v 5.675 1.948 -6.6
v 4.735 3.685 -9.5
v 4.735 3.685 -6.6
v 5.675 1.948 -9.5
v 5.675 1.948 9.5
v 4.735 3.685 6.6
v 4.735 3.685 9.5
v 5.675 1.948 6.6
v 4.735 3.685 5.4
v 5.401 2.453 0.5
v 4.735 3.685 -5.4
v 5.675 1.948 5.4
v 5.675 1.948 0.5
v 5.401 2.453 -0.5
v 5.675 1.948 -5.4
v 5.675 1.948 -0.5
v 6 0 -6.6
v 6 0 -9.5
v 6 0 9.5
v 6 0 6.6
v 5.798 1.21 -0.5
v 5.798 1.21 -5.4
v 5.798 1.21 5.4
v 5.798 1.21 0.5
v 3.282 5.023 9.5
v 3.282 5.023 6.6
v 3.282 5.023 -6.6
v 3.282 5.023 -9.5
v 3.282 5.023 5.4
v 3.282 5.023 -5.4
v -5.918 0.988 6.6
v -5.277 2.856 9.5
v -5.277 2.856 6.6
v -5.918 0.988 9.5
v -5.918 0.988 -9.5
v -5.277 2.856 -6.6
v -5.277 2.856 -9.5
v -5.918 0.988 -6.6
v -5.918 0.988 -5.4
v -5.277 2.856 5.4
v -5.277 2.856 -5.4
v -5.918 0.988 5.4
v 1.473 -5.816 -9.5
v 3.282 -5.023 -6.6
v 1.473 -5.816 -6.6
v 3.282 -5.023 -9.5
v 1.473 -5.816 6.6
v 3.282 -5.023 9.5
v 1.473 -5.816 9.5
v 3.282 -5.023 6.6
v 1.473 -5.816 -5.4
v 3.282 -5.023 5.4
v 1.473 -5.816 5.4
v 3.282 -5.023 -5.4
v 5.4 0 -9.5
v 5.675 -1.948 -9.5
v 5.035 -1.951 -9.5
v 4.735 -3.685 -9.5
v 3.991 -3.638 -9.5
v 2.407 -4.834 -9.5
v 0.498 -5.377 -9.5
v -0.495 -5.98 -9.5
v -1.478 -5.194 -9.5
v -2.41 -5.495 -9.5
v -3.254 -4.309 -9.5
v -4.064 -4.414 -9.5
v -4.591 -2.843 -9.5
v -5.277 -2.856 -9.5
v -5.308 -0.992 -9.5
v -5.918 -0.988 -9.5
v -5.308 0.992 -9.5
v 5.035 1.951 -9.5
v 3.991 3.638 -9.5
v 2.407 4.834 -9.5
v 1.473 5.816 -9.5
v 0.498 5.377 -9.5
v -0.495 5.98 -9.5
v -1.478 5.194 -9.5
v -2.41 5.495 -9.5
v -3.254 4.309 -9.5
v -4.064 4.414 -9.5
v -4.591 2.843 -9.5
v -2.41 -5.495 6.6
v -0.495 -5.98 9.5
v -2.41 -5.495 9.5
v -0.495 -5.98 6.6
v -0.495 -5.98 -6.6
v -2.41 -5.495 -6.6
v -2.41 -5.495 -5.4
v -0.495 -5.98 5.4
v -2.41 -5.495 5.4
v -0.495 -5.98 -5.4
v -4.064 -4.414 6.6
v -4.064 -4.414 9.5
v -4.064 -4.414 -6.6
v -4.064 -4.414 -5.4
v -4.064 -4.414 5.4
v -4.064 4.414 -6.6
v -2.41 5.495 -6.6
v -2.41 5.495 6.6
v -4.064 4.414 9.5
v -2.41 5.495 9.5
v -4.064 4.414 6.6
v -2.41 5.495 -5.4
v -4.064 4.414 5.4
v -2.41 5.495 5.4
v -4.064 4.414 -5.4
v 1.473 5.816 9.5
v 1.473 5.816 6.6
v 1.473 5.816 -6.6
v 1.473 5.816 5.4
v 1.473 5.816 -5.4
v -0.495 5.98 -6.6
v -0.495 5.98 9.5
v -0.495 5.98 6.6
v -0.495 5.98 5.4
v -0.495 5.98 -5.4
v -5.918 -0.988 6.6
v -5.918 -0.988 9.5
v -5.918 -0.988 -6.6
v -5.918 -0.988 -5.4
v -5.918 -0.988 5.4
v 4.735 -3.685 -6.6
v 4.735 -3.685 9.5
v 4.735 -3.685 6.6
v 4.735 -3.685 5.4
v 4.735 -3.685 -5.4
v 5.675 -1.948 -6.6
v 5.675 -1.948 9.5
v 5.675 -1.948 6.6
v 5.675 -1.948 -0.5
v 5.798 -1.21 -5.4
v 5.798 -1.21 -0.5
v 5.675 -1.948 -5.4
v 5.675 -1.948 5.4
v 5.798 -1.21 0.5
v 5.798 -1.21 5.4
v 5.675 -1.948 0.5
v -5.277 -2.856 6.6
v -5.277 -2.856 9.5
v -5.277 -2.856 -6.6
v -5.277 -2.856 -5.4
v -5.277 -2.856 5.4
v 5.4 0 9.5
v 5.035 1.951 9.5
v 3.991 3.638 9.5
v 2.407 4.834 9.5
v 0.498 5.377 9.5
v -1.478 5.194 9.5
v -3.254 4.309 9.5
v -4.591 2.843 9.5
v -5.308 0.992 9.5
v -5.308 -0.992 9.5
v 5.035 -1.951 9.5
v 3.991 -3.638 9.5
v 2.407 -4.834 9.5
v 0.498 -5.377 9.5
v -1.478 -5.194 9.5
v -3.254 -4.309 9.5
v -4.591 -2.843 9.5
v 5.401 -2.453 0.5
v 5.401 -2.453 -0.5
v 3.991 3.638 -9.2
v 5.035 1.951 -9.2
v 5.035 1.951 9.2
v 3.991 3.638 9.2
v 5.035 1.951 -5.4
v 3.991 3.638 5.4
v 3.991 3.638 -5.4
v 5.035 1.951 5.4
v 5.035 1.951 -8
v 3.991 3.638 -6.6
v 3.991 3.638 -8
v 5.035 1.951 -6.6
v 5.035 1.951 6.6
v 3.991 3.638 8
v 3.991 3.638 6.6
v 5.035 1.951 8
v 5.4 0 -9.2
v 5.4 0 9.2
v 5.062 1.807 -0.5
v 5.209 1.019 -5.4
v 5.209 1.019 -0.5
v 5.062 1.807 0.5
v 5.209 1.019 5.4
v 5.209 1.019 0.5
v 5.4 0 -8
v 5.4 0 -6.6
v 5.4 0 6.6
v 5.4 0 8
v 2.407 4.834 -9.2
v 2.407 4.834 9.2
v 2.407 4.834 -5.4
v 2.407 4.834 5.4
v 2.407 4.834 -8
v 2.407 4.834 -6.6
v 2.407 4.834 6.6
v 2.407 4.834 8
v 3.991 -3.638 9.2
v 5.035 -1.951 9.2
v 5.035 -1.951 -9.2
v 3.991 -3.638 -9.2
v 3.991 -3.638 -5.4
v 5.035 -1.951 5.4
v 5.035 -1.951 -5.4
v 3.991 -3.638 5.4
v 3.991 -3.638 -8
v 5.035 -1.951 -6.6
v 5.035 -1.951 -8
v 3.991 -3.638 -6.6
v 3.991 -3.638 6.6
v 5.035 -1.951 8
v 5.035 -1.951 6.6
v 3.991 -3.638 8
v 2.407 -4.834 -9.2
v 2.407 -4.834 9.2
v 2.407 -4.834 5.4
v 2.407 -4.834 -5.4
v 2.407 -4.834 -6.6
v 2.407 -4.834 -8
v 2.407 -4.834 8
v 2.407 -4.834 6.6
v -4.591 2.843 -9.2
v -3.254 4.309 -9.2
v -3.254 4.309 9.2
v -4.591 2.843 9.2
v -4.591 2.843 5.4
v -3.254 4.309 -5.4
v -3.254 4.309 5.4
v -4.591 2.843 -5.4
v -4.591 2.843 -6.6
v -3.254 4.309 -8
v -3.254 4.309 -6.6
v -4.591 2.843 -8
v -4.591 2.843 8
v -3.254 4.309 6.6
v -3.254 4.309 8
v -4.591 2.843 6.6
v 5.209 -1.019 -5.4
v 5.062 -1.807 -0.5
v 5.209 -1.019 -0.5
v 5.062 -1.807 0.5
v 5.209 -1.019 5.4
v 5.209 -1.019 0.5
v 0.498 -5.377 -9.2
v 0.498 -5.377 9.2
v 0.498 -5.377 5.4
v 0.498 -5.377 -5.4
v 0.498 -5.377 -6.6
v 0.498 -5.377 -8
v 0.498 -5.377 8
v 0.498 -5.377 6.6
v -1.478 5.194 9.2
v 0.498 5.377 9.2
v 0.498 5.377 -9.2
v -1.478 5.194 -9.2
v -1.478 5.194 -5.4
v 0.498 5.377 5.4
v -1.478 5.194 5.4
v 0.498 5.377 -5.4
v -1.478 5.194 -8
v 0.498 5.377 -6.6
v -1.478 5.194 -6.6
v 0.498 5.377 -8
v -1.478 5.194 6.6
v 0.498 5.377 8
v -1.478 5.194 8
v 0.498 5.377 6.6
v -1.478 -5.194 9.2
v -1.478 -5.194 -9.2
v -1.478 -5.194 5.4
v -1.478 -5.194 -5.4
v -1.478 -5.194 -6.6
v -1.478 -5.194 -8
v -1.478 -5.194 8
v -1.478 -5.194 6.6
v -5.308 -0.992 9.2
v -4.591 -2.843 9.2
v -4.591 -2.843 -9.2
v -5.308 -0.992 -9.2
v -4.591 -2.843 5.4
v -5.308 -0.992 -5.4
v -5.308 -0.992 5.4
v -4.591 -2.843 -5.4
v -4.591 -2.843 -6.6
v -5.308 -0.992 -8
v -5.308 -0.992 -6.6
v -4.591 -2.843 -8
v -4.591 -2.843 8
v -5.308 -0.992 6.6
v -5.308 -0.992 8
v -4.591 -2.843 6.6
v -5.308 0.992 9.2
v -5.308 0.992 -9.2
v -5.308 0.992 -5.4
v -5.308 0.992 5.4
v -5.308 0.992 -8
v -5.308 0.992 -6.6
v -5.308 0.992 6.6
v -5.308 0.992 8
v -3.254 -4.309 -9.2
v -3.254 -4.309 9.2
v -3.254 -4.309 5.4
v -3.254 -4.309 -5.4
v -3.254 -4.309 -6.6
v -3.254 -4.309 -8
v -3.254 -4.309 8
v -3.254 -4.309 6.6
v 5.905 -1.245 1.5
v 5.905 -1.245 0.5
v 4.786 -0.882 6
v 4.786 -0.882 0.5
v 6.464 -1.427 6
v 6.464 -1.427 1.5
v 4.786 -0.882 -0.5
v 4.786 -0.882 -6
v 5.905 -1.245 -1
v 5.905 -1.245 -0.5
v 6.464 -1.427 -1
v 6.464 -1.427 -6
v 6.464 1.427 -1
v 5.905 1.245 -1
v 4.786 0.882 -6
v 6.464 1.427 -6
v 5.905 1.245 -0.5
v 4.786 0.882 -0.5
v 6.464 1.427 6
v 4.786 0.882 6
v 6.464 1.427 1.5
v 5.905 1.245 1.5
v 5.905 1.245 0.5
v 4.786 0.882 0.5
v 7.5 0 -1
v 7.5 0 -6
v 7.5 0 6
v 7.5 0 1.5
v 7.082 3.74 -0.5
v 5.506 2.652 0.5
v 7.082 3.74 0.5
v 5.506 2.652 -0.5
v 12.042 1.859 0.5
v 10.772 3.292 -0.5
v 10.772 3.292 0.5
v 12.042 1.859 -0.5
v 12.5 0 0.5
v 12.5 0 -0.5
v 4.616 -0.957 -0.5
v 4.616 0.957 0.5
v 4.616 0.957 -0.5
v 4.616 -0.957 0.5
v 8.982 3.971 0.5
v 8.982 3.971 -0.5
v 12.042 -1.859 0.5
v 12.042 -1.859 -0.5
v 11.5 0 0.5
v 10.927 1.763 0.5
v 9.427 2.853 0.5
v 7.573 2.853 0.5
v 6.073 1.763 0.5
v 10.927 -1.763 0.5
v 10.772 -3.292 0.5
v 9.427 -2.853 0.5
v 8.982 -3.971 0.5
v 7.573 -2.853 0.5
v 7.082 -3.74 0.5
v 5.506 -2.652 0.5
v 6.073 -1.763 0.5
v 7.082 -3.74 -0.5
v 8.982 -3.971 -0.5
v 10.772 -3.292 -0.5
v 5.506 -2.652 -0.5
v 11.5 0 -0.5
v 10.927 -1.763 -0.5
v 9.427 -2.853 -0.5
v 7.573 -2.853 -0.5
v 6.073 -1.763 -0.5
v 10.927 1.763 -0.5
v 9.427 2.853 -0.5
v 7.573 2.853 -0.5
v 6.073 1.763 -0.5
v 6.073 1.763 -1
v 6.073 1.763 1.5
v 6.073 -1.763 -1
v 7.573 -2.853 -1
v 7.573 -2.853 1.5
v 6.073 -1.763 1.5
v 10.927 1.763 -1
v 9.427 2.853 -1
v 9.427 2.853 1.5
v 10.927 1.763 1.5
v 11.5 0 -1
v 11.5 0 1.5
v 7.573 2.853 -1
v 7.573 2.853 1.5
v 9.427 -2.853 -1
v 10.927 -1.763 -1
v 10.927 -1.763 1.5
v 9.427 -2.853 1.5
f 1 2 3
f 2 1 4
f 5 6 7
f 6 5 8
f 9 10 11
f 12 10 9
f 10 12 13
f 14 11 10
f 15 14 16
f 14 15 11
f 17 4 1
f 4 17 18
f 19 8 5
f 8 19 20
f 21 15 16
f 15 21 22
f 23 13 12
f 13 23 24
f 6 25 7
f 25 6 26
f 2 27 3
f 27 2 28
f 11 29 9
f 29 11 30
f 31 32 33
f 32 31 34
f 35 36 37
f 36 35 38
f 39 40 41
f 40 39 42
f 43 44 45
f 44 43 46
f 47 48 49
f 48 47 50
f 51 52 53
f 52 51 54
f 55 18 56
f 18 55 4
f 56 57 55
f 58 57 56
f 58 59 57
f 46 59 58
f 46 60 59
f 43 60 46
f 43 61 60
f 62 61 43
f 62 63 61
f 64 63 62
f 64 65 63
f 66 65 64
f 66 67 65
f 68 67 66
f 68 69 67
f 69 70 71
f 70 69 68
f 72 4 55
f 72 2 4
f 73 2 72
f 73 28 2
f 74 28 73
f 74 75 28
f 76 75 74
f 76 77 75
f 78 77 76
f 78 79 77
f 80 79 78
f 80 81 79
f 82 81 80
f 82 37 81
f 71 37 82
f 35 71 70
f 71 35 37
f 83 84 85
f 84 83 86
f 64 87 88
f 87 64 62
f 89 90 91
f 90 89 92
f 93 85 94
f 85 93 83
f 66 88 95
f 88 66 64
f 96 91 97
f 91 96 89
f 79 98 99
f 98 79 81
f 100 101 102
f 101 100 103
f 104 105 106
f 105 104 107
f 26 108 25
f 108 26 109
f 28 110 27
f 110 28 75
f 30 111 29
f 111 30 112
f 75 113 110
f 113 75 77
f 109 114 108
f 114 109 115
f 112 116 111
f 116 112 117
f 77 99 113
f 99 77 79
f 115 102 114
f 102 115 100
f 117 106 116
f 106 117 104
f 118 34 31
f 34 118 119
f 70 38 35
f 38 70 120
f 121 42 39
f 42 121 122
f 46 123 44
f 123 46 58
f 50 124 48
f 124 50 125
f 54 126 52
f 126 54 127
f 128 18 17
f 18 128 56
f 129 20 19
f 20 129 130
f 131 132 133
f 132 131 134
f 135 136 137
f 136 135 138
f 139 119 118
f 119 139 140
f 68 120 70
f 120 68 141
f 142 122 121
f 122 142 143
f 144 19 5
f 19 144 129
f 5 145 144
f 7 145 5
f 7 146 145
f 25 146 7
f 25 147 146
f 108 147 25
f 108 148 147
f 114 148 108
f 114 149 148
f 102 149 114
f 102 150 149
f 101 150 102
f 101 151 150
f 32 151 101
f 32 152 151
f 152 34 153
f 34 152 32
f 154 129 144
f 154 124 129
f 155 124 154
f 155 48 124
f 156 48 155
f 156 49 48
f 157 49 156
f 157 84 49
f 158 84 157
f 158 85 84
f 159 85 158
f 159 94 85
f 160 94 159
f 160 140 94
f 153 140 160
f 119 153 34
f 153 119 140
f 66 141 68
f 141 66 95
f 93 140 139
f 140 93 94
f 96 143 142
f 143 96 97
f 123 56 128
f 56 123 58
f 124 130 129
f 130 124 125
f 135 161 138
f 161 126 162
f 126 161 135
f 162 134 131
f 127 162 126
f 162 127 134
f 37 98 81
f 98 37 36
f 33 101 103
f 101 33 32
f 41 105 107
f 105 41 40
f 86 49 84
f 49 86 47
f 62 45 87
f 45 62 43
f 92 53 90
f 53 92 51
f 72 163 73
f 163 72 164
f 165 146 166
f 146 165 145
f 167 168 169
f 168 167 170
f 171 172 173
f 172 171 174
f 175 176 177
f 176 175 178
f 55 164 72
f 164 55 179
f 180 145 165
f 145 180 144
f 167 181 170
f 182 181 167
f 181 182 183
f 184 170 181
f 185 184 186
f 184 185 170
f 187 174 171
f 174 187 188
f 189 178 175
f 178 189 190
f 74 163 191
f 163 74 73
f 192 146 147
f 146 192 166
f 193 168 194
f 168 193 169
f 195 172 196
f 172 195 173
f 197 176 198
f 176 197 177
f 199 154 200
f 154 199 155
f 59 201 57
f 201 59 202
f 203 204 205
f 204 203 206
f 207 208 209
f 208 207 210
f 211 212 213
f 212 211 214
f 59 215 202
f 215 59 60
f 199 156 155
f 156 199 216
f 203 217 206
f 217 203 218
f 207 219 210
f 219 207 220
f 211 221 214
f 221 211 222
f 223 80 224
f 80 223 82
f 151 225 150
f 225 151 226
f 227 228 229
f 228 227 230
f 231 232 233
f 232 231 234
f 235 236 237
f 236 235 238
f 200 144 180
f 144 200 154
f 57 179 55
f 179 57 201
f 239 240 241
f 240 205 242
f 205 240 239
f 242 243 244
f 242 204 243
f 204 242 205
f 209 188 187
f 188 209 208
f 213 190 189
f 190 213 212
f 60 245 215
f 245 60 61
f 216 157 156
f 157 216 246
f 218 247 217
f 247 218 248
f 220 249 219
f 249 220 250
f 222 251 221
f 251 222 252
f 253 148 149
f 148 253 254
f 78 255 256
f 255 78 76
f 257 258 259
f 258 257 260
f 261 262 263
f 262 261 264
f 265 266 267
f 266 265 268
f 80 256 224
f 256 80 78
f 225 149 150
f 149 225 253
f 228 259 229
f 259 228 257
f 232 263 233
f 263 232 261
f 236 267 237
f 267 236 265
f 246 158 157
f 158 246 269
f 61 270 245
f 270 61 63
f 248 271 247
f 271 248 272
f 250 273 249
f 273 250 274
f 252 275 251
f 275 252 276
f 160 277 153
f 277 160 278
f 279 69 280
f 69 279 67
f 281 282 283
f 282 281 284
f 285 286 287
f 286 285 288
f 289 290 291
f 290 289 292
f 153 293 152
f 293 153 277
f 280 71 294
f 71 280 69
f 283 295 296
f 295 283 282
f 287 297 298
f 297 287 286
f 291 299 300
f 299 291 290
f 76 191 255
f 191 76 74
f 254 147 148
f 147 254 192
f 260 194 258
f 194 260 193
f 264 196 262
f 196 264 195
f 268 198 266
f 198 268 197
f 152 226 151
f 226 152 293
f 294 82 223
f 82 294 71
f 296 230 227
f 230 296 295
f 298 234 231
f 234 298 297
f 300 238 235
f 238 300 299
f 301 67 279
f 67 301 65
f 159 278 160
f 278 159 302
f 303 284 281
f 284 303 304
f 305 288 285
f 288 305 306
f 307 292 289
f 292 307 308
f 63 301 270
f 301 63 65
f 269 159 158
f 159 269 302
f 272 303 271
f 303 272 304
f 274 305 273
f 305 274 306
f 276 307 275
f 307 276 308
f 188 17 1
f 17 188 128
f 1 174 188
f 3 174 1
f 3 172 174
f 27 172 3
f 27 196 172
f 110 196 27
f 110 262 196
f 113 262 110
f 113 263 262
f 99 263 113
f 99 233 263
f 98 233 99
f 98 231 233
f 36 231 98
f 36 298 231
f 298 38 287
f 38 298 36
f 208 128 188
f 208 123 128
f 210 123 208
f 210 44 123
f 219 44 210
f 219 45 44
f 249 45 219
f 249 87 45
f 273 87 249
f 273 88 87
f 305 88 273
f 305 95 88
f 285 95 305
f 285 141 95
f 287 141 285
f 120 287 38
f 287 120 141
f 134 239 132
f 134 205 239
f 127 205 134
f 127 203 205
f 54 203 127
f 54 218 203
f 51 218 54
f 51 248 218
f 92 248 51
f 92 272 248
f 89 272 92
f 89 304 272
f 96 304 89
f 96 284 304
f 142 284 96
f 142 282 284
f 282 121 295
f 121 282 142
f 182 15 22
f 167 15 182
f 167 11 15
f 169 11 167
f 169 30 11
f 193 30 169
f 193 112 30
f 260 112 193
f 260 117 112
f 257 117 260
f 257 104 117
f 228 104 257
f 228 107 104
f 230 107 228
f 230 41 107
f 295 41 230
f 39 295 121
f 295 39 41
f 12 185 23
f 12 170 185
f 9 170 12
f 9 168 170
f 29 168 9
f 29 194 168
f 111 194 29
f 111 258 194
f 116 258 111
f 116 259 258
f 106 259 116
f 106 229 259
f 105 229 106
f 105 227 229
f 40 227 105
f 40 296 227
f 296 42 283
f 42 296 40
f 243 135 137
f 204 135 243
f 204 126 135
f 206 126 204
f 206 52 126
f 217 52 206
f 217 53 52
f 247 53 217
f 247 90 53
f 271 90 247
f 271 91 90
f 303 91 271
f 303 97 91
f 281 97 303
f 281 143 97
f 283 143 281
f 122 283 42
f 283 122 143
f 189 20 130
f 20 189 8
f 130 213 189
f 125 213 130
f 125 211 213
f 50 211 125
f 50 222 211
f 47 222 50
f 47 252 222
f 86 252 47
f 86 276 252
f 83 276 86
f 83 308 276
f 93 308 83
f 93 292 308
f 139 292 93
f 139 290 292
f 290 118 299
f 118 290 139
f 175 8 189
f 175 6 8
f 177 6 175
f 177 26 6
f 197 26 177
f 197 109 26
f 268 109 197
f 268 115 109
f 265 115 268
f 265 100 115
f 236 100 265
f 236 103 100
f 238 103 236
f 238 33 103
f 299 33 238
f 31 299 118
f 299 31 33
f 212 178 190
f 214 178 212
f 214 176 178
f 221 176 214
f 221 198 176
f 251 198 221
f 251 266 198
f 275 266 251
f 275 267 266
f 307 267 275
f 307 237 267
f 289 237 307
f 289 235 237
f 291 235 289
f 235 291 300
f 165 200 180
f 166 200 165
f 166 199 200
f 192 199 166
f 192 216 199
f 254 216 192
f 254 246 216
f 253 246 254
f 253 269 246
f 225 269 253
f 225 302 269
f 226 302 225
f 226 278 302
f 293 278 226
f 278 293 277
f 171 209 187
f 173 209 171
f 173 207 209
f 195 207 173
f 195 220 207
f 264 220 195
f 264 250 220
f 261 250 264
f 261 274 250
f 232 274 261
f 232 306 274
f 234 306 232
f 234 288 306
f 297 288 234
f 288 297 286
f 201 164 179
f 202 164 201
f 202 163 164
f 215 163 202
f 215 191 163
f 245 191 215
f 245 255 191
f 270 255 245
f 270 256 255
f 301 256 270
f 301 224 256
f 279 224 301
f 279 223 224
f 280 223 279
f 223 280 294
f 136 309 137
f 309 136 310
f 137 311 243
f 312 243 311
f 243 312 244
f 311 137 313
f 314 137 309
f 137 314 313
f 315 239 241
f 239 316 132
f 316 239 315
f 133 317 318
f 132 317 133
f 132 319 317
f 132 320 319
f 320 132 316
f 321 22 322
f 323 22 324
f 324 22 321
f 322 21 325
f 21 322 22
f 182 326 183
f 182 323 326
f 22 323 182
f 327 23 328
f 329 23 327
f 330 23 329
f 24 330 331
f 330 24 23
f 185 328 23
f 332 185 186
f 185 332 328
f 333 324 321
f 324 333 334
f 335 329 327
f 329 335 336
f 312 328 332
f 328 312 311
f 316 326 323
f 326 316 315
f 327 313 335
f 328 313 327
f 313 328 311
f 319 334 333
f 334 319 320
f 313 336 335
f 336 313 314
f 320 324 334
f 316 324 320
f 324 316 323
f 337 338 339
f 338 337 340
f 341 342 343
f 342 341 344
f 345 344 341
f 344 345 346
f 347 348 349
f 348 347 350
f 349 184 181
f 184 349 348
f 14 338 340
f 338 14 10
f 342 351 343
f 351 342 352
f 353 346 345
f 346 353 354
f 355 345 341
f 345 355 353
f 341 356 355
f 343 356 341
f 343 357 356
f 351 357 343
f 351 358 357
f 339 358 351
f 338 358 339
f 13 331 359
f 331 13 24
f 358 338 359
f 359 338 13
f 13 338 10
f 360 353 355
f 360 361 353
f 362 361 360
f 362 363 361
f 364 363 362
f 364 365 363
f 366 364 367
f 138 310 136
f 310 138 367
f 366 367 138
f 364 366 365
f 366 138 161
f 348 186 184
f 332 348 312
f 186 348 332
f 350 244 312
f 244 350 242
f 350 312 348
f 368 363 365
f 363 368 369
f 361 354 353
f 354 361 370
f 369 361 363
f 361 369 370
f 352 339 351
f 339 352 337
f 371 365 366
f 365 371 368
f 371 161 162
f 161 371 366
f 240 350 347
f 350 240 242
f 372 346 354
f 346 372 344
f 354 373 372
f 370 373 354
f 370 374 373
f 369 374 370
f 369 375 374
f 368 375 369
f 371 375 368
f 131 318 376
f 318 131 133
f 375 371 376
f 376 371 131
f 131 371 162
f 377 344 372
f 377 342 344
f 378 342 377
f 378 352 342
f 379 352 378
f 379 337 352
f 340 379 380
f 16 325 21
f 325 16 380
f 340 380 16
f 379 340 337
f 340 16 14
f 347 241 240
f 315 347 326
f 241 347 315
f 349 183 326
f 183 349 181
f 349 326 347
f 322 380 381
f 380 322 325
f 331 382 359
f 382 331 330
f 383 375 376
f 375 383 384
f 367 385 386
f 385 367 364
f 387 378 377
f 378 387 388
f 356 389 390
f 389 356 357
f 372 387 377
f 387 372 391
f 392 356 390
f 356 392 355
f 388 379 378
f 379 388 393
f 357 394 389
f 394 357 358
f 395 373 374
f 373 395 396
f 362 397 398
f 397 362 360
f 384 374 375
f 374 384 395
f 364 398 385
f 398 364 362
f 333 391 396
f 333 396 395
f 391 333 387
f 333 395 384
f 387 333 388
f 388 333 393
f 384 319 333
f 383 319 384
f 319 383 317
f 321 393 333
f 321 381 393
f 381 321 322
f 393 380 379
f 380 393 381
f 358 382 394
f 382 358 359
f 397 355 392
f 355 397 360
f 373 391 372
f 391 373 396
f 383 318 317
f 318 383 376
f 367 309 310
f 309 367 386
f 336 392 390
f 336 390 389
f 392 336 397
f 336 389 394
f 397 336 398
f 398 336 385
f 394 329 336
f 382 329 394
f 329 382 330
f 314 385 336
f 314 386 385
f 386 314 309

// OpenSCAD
// Parameters
bore_diameter_mm = 6; //[3:12:0.1]
outer_diameter_mm = 12; //[6:24:0.1]
length_mm = 19; //[10:38:0.1]
bore_radius_mm = 3; //[1.5:6:0.1]
outer_radius_mm = 6; //[3:12:0.1]
casing_thickness_mm = 0.6; //[0.3:1.2:0.05]
groove_radius_mm = 5.5; //[4.5:6:0.05]
groove_length_mm = 1.2; //[0.6:2.4:0.05]
groove_spacing_mm = 12; //[6:18:0.1]
seal_clearance_mm = 0.2; //[0.05:0.5:0.05]
seal_outer_scale = 1.12; //[1.05:1.25:0.01]
eps_mm = 0.5; //[0.2:2:0.1]
screw_shank_radius_mm = 1.5; //[0.8:3:0.1]
screw_length_mm = 12; //[6:24:0.5]
screw_head_radius_mm = 3; //[1.5:6:0.1]
screw_head_height_mm = 2.5; //[1:5:0.1]
washer_radius_mm = 4; //[2:8:0.1]
washer_thickness_mm = 1; //[0.5:2:0.1]

// Connectivity overlap (1–2mm) to guarantee attachment
overlap_mm = 1.5;

// Linear Bearing body (kept as original "shell" logic)
module linear_bearing_body() {
  color("DimGray")
    difference() {
      // Outer shell
      cylinder(r=outer_radius_mm, h=length_mm, center=true);

      // Inner bore
      cylinder(r=bore_radius_mm, h=length_mm + 2*eps_mm, center=true);

      // Outer casing (as in original code)
      cylinder(r=outer_radius_mm - casing_thickness_mm, h=length_mm, center=true);

      // Grooves
      translate([0, 0, -groove_spacing_mm/2])
        cylinder(r=outer_radius_mm + eps_mm, h=groove_length_mm, center=true);
      translate([0, 0,  groove_spacing_mm/2])
        cylinder(r=outer_radius_mm + eps_mm, h=groove_length_mm, center=true);

      // Seal cut
      cylinder(r=bore_radius_mm * seal_outer_scale, h=length_mm, center=true);
    }
}

// Add top/bottom dark rings/caps and physically attach them to the body
module bearing_with_caps() {
  cap_h = groove_length_mm;

  // Ensure caps INTERSECT the body by overlap_mm (no gaps):
  // Body spans z = [-length/2, +length/2]
  // Cap spans z = [z_cap - cap_h/2, z_cap + cap_h/2]
  // Make cap intrude into body by overlap_mm:
  // cap bottom = length/2 - overlap_mm  => z_cap = length/2 - overlap_mm + cap_h/2
  z_cap = length_mm/2 - overlap_mm + cap_h/2;

  union() {
    // Main body
    linear_bearing_body();

    // Top cap (attached with overlap)
    color("DimGray")
      translate([0, 0,  z_cap])
        cylinder(r=outer_radius_mm, h=cap_h, center=true);

    // Bottom cap (attached with overlap)
    color("DimGray")
      translate([0, 0, -z_cap])
        cylinder(r=outer_radius_mm, h=cap_h, center=true);
  }
}

// Screw and Washer - repositioned to intersect the bearing body (no floating)
module screw_and_washer_attached() {
  // Screw axis is parallel to Z; move it in +X so it penetrates the bearing wall by overlap_mm.
  // Ensure shank intersects: (x_screw + shank_r) > outer_r  AND (x_screw - shank_r) < outer_r
  x_screw = outer_radius_mm - screw_shank_radius_mm + overlap_mm;

  // Washer should also intersect the bearing by overlap_mm:
  // washer inner edge at (x_washer - washer_r) should be inside outer_radius by overlap_mm
  // => x_washer - washer_r = outer_r - overlap_mm  => x_washer = outer_r + washer_r - overlap_mm
  x_washer = outer_radius_mm + washer_radius_mm - overlap_mm;

  // Keep head above washer; ensure head overlaps washer slightly
  z_washer = 0;
  z_head   = washer_thickness_mm/2 + screw_head_height_mm/2 - overlap_mm;

  color("Silver")
    union() {
      // Screw shank (intersects bearing due to x_screw)
      translate([x_screw, 0, 0])
        cylinder(r=screw_shank_radius_mm, h=screw_length_mm, center=true);

      // Washer (intersects bearing due to x_washer)
      translate([x_washer, 0, z_washer])
        cylinder(r=washer_radius_mm, h=washer_thickness_mm, center=true);

      // Screw head (on top of washer, overlapping slightly)
      translate([x_washer, 0, z_head])
        cylinder(r=screw_head_radius_mm, h=screw_head_height_mm, center=true);
    }
}

// Assembly: ALL parts in a single solid union (no floating parts)
module assembly() {
  union() {
    bearing_with_caps();
    screw_and_washer_attached();
  }
}

assembly();
